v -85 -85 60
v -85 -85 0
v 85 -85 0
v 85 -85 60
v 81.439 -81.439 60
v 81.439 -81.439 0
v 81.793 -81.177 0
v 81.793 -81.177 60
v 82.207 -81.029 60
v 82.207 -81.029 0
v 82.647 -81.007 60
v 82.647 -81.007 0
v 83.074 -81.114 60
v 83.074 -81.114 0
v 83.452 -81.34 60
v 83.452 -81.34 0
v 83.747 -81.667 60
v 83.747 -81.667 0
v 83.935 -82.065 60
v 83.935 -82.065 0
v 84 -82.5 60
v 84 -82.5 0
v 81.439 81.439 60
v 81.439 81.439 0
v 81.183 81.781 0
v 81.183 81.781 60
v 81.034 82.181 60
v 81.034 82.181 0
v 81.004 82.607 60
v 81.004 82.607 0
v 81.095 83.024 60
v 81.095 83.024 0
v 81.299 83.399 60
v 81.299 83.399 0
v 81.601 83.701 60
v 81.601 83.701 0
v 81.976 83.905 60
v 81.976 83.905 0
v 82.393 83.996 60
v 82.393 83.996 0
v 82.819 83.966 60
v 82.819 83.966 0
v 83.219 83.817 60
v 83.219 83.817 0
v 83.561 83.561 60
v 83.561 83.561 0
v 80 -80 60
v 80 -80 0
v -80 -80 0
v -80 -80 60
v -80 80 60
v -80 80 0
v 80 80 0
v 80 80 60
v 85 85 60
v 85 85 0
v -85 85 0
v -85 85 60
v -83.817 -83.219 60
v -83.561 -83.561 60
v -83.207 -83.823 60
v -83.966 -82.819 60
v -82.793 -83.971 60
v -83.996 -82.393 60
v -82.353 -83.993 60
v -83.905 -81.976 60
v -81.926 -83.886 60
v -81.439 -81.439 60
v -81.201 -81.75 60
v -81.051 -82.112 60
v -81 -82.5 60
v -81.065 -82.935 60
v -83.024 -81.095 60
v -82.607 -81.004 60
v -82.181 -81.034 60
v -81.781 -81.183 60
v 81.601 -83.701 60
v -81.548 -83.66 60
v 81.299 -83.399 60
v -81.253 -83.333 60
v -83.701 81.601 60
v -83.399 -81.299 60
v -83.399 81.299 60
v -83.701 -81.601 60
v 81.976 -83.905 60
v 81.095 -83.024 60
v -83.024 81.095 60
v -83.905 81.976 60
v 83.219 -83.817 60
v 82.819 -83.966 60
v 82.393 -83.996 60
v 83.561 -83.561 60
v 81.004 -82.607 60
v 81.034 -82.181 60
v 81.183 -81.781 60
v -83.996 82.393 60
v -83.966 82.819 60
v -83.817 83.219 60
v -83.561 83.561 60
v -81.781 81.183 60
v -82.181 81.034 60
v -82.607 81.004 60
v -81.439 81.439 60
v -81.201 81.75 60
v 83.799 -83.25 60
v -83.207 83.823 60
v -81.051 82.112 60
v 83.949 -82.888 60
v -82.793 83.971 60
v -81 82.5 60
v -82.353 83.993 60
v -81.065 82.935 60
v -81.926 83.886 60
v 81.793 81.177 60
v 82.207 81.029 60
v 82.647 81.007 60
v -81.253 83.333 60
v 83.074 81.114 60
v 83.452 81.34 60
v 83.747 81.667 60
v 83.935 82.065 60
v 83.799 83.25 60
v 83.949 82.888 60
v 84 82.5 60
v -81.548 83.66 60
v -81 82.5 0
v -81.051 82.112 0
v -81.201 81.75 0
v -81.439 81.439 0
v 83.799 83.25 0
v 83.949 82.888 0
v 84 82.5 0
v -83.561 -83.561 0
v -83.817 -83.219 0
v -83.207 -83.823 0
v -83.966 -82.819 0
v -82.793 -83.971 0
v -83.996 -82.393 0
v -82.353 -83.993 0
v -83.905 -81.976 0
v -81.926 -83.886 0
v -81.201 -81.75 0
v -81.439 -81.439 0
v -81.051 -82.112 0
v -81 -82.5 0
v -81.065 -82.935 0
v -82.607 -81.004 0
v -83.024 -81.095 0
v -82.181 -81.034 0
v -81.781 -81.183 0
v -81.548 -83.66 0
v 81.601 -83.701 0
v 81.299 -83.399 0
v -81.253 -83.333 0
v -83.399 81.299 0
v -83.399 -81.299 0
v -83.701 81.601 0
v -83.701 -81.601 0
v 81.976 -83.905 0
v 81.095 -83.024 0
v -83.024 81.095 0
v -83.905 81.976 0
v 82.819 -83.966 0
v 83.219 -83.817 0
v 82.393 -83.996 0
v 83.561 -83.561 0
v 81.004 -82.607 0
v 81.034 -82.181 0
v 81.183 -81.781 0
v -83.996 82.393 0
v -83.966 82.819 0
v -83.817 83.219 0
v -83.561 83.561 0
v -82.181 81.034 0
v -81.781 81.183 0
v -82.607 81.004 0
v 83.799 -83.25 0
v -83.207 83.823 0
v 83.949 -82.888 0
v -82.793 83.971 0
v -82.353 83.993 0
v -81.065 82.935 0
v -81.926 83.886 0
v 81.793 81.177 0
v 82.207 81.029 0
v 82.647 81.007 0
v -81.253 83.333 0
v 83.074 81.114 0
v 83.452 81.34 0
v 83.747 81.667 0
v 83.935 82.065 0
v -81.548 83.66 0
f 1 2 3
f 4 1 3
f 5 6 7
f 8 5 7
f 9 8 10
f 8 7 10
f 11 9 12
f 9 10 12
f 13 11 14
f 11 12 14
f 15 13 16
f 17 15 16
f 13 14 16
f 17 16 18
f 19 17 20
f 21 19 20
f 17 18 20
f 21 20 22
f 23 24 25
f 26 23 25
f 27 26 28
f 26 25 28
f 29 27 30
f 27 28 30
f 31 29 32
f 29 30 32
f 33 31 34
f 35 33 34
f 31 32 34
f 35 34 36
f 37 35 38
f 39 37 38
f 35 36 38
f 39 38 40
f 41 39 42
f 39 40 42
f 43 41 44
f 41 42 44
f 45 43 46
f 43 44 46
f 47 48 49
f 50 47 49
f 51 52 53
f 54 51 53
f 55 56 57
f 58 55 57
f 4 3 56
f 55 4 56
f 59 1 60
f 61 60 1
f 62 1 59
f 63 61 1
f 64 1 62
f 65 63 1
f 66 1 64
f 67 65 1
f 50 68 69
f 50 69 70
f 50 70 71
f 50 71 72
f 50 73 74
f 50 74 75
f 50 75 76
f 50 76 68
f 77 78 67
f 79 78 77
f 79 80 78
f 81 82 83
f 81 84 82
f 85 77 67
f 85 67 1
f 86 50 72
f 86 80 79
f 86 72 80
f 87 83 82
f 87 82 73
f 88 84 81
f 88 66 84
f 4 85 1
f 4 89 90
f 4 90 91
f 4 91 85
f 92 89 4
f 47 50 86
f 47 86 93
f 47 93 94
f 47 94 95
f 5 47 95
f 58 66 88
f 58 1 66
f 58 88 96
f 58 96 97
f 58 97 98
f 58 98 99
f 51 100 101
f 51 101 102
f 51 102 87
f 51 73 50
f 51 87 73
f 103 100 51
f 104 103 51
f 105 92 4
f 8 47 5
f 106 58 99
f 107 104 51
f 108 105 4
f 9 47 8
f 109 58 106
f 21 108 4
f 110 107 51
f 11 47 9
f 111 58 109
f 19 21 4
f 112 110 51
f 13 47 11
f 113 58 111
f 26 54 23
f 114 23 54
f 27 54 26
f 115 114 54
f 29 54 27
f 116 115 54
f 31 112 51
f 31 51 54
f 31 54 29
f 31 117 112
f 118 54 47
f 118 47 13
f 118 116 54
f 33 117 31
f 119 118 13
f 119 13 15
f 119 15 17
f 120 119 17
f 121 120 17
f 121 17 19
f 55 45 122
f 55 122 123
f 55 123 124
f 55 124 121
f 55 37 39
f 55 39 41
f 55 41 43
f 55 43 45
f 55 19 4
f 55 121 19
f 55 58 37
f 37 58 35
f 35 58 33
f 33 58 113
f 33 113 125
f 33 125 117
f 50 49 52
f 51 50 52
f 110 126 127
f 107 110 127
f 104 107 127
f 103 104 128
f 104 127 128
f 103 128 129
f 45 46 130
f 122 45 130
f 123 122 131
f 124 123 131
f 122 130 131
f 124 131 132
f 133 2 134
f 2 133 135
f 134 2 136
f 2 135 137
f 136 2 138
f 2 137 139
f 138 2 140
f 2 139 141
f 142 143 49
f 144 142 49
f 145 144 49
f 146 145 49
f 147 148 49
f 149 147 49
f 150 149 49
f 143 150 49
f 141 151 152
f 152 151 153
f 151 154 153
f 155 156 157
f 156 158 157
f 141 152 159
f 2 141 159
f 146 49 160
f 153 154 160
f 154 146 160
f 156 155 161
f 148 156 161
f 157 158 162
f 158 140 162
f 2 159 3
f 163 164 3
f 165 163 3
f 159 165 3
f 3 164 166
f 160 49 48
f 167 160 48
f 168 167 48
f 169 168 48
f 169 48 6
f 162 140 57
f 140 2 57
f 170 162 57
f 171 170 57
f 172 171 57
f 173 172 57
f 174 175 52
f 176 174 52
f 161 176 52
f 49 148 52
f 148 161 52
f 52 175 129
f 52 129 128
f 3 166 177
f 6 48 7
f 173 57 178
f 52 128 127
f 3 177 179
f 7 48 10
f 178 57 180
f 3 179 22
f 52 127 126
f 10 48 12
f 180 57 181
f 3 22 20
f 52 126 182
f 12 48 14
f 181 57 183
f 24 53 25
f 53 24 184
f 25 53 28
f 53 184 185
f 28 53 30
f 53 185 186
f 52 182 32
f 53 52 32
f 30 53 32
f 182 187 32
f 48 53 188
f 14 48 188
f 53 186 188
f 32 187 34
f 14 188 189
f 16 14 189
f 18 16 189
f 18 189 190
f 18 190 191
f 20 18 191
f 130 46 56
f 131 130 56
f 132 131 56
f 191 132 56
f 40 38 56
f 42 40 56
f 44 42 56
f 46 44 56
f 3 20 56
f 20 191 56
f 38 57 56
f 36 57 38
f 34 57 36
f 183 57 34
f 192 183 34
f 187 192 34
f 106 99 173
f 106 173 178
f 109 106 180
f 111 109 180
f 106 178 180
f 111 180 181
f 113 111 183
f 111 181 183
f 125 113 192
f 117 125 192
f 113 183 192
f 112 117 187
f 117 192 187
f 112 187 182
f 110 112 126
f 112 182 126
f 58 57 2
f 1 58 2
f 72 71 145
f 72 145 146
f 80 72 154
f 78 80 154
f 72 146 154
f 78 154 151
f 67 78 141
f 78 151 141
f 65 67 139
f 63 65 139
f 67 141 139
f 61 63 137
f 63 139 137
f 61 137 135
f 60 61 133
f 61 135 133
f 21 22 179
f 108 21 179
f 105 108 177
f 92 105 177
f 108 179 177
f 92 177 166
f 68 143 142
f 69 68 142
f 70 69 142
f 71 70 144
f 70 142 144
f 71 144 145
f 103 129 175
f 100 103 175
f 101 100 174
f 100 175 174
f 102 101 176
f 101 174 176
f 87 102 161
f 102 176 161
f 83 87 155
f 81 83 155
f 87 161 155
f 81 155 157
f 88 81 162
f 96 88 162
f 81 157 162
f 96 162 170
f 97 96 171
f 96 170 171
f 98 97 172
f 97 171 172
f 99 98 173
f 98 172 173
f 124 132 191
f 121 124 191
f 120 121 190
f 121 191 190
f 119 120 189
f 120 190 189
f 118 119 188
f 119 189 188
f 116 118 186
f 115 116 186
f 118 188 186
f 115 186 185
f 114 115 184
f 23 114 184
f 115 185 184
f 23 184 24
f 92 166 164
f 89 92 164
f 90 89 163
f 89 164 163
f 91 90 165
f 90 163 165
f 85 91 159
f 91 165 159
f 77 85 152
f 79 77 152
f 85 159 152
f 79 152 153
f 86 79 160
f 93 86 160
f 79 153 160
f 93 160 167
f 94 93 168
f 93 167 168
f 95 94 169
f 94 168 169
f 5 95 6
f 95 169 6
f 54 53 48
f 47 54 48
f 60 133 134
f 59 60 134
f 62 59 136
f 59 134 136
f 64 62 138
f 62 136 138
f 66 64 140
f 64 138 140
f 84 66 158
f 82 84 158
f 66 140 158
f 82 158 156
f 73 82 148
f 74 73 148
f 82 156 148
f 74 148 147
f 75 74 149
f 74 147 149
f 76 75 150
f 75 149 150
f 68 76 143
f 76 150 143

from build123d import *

# Parameters (mm, degrees)
F1_DEPTH = 60


with BuildPart() as f1:
    # F0 (on Top) → F1 (new body)
    with BuildSketch(Plane.XY):
        with BuildLine():
            Line((-85, -85), (85, -85))
            Line((85, -85), (83.56066, -83.56066))
            ThreePointArc((83.56066, -83.56066), (81.43934, -83.56066), (81.43934, -81.43934))
            Line((81.43934, -81.43934), (80.000001, -80.000001))
            Line((80.000001, -80.000001), (-80.000001, -80.000001))
            Line((-80.000001, -80.000001), (-81.43934, -81.43934))
            ThreePointArc((-81.43934, -81.43934), (-81.114181, -81.925975), (-81, -82.5))
            ThreePointArc((-81, -82.5), (-81.925975, -83.88582), (-83.56066, -83.56066))
            Line((-83.56066, -83.56066), (-85, -85))
        make_face()
        with BuildLine():
            Line((-85, 85), (-85, -85))
            Line((-85, -85), (-83.56066, -83.56066))
            ThreePointArc((-83.56066, -83.56066), (-83.56066, -81.43934), (-81.43934, -81.43934))
            Line((-81.43934, -81.43934), (-80.000001, -80.000001))
            Line((-80.000001, -80.000001), (-80.000001, 80.000001))
            Line((-80.000001, 80.000001), (-81.43934, 81.43934))
            ThreePointArc((-81.43934, 81.43934), (-83.56066, 81.43934), (-83.56066, 83.56066))
            Line((-83.56066, 83.56066), (-85, 85))
        make_face()
        with BuildLine():
            Line((83.56066, -83.56066), (85, -85))
            Line((85, -85), (85, 85))
            Line((85, 85), (83.56066, 83.56066))
            ThreePointArc((83.56066, 83.56066), (83.88582, 83.074025), (84, 82.5))
            ThreePointArc((84, 82.5), (83.074025, 81.114181), (81.43934, 81.43934))
            Line((81.43934, 81.43934), (80.000001, 80.000001))
            Line((80.000001, 80.000001), (80.000001, -80.000001))
            Line((80.000001, -80.000001), (81.43934, -81.43934))
            ThreePointArc((81.43934, -81.43934), (83.074025, -81.114181), (84, -82.5))
            ThreePointArc((84, -82.5), (83.88582, -83.074025), (83.56066, -83.56066))
        make_face()
        with BuildLine():
            Line((83.56066, 83.56066), (85, 85))
            Line((85, 85), (-85, 85))
            Line((-85, 85), (-83.56066, 83.56066))
            ThreePointArc((-83.56066, 83.56066), (-81.925975, 83.88582), (-81, 82.5))
            ThreePointArc((-81, 82.5), (-81.114181, 81.925975), (-81.43934, 81.43934))
            Line((-81.43934, 81.43934), (-80.000001, 80.000001))
            Line((-80.000001, 80.000001), (80.000001, 80.000001))
            Line((80.000001, 80.000001), (81.43934, 81.43934))
            ThreePointArc((81.43934, 81.43934), (81.43934, 83.56066), (83.56066, 83.56066))
        make_face()
    extrude(amount=F1_DEPTH)


solid = f1.part
